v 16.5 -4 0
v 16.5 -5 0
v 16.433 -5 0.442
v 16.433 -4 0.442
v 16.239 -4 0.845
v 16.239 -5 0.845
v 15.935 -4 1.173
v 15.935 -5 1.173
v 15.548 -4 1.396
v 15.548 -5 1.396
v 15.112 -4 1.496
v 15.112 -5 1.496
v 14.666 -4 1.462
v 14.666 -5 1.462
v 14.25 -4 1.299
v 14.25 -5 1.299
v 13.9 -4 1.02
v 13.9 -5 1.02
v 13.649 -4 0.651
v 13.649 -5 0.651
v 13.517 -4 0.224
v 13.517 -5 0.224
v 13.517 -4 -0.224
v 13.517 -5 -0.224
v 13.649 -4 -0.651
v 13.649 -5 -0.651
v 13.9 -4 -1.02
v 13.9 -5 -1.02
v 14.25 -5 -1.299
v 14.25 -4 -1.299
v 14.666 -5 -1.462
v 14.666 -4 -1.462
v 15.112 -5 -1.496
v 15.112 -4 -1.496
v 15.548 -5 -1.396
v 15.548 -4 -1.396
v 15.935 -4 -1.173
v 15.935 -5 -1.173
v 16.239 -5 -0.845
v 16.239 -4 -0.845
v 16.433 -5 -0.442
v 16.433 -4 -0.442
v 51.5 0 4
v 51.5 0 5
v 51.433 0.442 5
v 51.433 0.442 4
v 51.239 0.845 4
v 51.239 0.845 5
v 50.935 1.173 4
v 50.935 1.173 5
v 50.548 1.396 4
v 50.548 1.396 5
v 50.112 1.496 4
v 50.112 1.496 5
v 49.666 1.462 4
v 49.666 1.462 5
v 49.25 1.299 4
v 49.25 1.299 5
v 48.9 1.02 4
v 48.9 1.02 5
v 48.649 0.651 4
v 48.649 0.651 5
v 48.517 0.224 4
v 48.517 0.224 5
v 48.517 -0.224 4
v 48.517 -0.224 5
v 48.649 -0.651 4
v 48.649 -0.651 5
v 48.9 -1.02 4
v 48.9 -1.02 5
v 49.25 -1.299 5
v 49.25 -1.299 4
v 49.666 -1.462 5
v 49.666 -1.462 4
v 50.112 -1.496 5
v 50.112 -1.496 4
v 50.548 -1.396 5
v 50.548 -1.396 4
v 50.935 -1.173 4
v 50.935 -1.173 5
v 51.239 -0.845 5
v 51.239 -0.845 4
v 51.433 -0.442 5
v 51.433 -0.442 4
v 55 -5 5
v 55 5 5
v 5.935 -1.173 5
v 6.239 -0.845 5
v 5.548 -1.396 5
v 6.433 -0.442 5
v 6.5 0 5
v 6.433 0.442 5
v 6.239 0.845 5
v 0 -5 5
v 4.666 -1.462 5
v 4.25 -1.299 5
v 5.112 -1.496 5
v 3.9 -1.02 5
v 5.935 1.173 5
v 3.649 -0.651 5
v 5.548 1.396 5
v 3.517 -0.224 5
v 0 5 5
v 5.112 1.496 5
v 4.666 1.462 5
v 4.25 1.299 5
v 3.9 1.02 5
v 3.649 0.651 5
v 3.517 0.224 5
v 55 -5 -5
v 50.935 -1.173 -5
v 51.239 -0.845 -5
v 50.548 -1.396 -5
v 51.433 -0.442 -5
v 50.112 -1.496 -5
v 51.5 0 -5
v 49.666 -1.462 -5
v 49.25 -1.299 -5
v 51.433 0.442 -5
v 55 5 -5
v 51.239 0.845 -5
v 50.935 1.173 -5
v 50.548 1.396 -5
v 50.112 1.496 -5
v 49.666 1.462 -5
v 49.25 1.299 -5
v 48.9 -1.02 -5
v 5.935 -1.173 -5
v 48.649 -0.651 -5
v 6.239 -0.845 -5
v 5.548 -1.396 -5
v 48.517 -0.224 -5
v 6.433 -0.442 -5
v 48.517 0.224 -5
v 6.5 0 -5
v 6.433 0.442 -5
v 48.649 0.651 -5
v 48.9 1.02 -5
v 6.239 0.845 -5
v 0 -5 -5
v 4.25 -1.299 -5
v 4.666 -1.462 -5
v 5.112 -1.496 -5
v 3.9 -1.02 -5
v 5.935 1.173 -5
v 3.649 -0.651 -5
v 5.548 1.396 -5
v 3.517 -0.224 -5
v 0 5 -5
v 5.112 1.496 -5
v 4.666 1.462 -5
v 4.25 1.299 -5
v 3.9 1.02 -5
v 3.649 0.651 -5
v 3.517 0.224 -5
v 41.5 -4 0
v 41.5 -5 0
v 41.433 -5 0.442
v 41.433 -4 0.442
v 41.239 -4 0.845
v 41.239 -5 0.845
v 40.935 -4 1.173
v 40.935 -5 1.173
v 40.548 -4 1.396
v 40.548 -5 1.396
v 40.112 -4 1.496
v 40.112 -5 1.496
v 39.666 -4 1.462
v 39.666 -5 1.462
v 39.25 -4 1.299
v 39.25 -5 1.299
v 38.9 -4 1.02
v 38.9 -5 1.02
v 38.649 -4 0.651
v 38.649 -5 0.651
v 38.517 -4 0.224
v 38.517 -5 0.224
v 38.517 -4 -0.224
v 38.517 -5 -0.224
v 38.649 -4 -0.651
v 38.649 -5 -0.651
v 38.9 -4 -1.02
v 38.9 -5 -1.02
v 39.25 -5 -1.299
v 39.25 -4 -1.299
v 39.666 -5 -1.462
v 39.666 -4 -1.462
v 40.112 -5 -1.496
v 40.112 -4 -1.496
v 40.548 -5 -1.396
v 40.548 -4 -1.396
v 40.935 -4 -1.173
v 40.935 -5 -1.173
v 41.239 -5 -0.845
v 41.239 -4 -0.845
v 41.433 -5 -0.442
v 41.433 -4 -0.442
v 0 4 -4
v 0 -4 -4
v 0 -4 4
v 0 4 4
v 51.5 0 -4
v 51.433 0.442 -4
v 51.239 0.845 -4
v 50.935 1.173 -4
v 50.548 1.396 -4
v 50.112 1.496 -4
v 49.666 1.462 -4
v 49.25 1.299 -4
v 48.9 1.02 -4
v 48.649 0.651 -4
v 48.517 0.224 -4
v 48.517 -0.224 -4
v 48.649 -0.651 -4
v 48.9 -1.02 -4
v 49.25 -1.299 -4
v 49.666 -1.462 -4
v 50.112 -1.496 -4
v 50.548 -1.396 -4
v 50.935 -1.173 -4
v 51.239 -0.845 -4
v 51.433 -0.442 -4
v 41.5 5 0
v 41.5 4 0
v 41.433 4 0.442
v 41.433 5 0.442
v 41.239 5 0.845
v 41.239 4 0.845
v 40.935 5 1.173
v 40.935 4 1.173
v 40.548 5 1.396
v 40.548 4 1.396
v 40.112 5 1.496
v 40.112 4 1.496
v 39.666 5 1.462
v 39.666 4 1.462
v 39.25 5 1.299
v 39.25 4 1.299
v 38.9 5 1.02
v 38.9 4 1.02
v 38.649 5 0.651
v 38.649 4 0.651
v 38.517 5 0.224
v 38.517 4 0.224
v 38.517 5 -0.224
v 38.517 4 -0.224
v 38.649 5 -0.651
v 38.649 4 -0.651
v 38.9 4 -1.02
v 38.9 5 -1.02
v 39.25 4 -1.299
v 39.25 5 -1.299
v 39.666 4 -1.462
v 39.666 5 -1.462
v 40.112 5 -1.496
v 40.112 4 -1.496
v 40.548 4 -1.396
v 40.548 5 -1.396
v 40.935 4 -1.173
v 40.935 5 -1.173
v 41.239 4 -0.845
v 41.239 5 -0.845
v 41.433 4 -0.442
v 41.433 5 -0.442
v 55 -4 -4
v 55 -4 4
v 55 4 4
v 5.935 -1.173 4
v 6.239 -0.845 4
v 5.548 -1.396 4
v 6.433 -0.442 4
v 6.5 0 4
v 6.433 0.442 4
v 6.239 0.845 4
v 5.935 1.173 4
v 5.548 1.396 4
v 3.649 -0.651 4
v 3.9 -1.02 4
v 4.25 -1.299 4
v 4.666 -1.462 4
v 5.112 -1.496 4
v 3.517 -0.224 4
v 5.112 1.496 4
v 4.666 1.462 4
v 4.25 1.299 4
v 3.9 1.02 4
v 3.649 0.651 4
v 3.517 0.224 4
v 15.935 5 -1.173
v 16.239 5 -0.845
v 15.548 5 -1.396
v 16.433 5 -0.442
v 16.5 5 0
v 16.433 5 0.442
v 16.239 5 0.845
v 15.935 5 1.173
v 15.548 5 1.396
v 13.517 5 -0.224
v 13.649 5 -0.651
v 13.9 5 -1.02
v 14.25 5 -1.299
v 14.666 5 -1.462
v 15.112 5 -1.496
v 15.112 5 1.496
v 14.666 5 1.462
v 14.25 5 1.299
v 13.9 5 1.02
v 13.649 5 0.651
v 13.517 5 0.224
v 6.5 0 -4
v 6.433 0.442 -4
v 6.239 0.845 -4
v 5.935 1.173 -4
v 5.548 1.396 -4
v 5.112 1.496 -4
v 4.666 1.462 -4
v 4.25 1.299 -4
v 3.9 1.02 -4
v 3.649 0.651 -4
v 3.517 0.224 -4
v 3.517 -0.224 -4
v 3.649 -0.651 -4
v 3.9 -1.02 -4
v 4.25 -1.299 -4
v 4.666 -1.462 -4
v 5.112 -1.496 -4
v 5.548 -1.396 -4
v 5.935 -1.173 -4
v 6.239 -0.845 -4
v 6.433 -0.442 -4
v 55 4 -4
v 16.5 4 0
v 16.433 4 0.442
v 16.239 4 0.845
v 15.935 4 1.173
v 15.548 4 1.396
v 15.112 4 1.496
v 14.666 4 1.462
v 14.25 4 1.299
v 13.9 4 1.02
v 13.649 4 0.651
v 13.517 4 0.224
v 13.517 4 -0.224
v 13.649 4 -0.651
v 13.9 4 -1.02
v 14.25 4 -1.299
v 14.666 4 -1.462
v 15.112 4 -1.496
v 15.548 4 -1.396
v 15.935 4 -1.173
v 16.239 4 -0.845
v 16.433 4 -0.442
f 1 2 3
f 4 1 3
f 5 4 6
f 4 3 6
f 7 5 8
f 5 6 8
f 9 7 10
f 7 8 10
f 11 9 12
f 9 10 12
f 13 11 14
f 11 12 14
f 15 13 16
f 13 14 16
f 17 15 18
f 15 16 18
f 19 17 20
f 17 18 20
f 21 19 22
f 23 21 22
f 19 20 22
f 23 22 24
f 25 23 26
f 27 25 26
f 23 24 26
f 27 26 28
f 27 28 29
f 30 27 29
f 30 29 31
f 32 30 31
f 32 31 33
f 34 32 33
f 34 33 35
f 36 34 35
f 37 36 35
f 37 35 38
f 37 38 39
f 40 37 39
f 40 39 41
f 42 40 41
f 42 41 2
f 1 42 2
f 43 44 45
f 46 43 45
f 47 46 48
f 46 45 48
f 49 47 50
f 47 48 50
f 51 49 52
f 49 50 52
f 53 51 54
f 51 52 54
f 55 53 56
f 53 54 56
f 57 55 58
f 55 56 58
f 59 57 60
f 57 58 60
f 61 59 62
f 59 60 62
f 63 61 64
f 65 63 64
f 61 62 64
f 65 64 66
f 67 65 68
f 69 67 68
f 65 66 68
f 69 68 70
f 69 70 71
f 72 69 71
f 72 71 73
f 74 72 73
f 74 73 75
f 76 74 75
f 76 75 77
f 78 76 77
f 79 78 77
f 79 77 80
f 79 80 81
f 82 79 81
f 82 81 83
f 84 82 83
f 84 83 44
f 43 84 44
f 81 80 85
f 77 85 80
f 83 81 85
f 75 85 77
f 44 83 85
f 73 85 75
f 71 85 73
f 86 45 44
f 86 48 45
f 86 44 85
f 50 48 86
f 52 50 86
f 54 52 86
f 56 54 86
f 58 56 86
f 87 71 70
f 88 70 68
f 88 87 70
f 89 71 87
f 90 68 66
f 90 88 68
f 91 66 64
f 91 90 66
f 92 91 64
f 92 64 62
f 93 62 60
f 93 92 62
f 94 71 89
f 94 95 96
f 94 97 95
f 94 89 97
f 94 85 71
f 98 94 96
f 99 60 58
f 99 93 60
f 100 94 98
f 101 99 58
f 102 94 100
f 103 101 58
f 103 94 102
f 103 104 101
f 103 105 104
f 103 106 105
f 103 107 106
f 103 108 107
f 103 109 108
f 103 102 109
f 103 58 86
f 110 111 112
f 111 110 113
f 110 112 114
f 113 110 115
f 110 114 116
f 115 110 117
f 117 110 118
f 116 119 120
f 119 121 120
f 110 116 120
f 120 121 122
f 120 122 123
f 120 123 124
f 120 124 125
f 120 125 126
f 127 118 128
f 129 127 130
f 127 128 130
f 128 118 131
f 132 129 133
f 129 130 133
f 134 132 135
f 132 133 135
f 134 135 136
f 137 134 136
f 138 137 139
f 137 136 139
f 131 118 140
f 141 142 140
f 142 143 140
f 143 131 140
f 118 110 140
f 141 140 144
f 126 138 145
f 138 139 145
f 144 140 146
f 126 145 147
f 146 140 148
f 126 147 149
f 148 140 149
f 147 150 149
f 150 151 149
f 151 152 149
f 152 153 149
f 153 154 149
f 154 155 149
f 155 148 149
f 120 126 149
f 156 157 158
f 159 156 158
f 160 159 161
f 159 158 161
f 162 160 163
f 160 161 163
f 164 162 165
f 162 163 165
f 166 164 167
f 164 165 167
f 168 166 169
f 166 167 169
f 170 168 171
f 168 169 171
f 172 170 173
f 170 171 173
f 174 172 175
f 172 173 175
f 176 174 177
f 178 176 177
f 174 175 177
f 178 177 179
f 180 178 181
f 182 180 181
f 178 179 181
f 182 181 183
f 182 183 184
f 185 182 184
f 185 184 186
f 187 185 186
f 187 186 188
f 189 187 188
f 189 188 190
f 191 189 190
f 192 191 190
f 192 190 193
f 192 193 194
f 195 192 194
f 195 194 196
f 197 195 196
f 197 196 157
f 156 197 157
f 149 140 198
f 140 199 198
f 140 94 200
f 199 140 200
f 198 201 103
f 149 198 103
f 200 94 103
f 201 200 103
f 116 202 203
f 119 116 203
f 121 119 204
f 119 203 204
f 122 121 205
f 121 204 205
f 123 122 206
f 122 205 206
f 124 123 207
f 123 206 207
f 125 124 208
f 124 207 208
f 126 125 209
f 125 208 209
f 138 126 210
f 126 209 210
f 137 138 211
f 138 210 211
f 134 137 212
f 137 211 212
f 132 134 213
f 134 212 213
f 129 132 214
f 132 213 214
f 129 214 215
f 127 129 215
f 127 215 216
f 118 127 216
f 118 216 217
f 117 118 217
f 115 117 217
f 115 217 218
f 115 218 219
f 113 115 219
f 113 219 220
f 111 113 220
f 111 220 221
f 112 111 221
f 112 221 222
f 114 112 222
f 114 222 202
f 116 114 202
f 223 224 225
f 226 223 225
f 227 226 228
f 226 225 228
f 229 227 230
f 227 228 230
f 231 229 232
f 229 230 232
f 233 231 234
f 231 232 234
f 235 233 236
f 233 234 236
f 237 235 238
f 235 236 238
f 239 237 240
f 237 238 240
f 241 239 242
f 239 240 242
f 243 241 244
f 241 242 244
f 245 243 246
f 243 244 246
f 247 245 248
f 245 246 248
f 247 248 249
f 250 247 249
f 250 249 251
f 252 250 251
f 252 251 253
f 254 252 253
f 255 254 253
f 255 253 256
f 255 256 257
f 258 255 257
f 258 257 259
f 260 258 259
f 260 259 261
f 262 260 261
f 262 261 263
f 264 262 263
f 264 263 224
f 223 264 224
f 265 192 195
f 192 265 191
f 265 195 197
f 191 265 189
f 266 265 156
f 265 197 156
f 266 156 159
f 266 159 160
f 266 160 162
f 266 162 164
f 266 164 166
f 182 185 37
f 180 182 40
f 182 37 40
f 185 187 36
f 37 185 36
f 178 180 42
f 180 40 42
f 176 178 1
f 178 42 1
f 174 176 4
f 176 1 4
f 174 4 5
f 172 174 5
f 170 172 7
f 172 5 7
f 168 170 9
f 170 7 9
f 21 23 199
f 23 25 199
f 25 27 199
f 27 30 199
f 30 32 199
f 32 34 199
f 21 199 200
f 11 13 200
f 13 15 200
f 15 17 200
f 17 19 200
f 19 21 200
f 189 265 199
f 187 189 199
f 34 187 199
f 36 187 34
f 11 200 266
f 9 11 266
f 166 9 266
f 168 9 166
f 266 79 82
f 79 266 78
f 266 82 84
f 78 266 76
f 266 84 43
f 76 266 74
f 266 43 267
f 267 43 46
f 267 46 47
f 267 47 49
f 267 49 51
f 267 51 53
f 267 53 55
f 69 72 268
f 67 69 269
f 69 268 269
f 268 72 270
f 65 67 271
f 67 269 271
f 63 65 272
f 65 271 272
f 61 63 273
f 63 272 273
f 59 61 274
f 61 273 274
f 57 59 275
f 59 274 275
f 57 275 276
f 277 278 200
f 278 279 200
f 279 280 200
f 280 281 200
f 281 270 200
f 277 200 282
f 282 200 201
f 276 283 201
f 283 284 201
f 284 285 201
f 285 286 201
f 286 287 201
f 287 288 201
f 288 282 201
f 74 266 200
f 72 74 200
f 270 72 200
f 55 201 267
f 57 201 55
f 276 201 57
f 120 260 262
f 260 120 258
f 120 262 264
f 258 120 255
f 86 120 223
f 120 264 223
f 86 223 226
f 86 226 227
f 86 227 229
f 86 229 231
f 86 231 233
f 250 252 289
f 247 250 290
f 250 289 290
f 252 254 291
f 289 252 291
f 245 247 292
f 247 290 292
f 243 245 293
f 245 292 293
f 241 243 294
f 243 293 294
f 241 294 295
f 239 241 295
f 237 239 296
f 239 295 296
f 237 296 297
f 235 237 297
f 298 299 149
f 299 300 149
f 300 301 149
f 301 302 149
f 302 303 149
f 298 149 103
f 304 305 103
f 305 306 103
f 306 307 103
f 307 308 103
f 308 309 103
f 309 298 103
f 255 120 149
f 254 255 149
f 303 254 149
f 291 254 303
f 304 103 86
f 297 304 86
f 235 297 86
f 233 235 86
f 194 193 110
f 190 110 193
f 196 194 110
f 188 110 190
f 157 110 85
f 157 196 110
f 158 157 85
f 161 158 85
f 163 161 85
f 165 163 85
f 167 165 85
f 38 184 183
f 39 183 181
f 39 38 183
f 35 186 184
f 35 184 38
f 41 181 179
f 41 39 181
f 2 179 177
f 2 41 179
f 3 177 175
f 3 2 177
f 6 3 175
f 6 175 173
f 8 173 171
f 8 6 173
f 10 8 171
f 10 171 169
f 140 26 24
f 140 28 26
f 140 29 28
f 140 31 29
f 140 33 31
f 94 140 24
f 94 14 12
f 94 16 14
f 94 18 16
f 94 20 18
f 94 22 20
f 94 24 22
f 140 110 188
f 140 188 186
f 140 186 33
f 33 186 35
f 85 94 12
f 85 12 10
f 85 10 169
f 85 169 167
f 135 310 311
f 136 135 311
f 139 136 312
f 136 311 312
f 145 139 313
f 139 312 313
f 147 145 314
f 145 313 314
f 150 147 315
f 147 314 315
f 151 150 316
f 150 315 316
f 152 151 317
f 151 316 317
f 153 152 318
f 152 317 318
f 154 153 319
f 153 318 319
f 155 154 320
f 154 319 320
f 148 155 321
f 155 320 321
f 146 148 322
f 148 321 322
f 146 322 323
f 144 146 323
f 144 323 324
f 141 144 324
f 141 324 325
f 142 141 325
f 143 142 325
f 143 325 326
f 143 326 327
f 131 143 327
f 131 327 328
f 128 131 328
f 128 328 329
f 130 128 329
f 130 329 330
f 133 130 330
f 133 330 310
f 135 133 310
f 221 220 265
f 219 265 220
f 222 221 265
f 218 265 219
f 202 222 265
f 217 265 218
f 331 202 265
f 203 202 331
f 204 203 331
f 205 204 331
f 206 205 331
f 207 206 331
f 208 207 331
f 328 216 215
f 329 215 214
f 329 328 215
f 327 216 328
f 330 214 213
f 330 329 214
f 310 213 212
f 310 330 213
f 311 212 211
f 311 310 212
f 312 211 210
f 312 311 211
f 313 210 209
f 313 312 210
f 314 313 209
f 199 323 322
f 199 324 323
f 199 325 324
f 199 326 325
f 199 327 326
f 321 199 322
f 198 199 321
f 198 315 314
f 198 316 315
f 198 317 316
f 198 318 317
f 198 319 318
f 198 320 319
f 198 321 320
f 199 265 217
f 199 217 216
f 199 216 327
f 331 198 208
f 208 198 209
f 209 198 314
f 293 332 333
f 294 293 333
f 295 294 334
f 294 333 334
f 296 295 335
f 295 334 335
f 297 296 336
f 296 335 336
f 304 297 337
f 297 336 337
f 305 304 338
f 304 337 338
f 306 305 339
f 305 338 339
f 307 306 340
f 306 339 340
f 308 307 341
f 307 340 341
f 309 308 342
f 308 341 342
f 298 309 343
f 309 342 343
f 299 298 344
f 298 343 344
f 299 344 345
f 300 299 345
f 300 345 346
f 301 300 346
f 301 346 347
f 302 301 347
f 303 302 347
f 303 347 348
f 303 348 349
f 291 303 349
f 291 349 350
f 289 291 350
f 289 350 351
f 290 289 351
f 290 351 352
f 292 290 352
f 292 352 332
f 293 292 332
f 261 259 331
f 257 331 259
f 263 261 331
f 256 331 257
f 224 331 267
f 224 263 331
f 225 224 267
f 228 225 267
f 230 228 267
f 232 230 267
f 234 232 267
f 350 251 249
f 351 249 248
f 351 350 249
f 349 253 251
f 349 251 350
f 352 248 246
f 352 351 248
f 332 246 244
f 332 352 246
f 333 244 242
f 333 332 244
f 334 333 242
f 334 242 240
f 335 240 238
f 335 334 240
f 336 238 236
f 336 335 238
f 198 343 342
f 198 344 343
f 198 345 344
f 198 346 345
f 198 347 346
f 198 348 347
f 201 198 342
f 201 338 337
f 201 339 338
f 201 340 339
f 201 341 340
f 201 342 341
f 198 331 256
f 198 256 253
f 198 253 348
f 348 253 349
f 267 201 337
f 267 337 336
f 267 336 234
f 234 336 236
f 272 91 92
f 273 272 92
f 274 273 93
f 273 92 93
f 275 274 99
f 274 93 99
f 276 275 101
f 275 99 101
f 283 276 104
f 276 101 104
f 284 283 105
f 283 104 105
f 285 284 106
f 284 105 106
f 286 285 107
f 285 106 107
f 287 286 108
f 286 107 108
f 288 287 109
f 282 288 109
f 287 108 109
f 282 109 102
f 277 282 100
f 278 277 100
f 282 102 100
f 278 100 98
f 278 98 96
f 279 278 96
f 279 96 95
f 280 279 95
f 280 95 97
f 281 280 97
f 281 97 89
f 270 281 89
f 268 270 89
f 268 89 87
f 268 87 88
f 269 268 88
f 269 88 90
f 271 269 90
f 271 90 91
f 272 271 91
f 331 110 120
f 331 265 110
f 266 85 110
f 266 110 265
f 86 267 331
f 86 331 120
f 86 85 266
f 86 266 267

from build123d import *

# Parameters (mm, degrees)
F0_W     = 10
F0_H     = 10
F0_W_2   = 8
F0_H_2   = 8
F1_DEPTH = 55
F2_R     = 1.5
F3_DEPTH = 25
F4_R     = 1.5
F5_DEPTH = 25


with BuildPart() as f1:
    # F0 (on Right) → F1 (new body)
    with BuildSketch(Plane.YZ):
        Rectangle(F0_W, F0_H)
        Rectangle(F0_W_2, F0_H_2, mode=Mode.SUBTRACT)
    extrude(amount=F1_DEPTH)

    # F2 (on face) → F3 (cut)
    with BuildSketch(Plane.XY.offset(5)):
        with Locations((5, 0)):
            Circle(F2_R)
        with Locations((50, 0)):
            Circle(F2_R)
    extrude(amount=-F3_DEPTH, mode=Mode.SUBTRACT)

    # F4 (on face) → F5 (cut)
    with BuildSketch(Plane.XZ.offset(5)):
        with Locations((15, 0)):
            Circle(F4_R)
        with Locations((40, 0)):
            Circle(F4_R)
    extrude(amount=-F5_DEPTH, mode=Mode.SUBTRACT)


solid = f1.part
